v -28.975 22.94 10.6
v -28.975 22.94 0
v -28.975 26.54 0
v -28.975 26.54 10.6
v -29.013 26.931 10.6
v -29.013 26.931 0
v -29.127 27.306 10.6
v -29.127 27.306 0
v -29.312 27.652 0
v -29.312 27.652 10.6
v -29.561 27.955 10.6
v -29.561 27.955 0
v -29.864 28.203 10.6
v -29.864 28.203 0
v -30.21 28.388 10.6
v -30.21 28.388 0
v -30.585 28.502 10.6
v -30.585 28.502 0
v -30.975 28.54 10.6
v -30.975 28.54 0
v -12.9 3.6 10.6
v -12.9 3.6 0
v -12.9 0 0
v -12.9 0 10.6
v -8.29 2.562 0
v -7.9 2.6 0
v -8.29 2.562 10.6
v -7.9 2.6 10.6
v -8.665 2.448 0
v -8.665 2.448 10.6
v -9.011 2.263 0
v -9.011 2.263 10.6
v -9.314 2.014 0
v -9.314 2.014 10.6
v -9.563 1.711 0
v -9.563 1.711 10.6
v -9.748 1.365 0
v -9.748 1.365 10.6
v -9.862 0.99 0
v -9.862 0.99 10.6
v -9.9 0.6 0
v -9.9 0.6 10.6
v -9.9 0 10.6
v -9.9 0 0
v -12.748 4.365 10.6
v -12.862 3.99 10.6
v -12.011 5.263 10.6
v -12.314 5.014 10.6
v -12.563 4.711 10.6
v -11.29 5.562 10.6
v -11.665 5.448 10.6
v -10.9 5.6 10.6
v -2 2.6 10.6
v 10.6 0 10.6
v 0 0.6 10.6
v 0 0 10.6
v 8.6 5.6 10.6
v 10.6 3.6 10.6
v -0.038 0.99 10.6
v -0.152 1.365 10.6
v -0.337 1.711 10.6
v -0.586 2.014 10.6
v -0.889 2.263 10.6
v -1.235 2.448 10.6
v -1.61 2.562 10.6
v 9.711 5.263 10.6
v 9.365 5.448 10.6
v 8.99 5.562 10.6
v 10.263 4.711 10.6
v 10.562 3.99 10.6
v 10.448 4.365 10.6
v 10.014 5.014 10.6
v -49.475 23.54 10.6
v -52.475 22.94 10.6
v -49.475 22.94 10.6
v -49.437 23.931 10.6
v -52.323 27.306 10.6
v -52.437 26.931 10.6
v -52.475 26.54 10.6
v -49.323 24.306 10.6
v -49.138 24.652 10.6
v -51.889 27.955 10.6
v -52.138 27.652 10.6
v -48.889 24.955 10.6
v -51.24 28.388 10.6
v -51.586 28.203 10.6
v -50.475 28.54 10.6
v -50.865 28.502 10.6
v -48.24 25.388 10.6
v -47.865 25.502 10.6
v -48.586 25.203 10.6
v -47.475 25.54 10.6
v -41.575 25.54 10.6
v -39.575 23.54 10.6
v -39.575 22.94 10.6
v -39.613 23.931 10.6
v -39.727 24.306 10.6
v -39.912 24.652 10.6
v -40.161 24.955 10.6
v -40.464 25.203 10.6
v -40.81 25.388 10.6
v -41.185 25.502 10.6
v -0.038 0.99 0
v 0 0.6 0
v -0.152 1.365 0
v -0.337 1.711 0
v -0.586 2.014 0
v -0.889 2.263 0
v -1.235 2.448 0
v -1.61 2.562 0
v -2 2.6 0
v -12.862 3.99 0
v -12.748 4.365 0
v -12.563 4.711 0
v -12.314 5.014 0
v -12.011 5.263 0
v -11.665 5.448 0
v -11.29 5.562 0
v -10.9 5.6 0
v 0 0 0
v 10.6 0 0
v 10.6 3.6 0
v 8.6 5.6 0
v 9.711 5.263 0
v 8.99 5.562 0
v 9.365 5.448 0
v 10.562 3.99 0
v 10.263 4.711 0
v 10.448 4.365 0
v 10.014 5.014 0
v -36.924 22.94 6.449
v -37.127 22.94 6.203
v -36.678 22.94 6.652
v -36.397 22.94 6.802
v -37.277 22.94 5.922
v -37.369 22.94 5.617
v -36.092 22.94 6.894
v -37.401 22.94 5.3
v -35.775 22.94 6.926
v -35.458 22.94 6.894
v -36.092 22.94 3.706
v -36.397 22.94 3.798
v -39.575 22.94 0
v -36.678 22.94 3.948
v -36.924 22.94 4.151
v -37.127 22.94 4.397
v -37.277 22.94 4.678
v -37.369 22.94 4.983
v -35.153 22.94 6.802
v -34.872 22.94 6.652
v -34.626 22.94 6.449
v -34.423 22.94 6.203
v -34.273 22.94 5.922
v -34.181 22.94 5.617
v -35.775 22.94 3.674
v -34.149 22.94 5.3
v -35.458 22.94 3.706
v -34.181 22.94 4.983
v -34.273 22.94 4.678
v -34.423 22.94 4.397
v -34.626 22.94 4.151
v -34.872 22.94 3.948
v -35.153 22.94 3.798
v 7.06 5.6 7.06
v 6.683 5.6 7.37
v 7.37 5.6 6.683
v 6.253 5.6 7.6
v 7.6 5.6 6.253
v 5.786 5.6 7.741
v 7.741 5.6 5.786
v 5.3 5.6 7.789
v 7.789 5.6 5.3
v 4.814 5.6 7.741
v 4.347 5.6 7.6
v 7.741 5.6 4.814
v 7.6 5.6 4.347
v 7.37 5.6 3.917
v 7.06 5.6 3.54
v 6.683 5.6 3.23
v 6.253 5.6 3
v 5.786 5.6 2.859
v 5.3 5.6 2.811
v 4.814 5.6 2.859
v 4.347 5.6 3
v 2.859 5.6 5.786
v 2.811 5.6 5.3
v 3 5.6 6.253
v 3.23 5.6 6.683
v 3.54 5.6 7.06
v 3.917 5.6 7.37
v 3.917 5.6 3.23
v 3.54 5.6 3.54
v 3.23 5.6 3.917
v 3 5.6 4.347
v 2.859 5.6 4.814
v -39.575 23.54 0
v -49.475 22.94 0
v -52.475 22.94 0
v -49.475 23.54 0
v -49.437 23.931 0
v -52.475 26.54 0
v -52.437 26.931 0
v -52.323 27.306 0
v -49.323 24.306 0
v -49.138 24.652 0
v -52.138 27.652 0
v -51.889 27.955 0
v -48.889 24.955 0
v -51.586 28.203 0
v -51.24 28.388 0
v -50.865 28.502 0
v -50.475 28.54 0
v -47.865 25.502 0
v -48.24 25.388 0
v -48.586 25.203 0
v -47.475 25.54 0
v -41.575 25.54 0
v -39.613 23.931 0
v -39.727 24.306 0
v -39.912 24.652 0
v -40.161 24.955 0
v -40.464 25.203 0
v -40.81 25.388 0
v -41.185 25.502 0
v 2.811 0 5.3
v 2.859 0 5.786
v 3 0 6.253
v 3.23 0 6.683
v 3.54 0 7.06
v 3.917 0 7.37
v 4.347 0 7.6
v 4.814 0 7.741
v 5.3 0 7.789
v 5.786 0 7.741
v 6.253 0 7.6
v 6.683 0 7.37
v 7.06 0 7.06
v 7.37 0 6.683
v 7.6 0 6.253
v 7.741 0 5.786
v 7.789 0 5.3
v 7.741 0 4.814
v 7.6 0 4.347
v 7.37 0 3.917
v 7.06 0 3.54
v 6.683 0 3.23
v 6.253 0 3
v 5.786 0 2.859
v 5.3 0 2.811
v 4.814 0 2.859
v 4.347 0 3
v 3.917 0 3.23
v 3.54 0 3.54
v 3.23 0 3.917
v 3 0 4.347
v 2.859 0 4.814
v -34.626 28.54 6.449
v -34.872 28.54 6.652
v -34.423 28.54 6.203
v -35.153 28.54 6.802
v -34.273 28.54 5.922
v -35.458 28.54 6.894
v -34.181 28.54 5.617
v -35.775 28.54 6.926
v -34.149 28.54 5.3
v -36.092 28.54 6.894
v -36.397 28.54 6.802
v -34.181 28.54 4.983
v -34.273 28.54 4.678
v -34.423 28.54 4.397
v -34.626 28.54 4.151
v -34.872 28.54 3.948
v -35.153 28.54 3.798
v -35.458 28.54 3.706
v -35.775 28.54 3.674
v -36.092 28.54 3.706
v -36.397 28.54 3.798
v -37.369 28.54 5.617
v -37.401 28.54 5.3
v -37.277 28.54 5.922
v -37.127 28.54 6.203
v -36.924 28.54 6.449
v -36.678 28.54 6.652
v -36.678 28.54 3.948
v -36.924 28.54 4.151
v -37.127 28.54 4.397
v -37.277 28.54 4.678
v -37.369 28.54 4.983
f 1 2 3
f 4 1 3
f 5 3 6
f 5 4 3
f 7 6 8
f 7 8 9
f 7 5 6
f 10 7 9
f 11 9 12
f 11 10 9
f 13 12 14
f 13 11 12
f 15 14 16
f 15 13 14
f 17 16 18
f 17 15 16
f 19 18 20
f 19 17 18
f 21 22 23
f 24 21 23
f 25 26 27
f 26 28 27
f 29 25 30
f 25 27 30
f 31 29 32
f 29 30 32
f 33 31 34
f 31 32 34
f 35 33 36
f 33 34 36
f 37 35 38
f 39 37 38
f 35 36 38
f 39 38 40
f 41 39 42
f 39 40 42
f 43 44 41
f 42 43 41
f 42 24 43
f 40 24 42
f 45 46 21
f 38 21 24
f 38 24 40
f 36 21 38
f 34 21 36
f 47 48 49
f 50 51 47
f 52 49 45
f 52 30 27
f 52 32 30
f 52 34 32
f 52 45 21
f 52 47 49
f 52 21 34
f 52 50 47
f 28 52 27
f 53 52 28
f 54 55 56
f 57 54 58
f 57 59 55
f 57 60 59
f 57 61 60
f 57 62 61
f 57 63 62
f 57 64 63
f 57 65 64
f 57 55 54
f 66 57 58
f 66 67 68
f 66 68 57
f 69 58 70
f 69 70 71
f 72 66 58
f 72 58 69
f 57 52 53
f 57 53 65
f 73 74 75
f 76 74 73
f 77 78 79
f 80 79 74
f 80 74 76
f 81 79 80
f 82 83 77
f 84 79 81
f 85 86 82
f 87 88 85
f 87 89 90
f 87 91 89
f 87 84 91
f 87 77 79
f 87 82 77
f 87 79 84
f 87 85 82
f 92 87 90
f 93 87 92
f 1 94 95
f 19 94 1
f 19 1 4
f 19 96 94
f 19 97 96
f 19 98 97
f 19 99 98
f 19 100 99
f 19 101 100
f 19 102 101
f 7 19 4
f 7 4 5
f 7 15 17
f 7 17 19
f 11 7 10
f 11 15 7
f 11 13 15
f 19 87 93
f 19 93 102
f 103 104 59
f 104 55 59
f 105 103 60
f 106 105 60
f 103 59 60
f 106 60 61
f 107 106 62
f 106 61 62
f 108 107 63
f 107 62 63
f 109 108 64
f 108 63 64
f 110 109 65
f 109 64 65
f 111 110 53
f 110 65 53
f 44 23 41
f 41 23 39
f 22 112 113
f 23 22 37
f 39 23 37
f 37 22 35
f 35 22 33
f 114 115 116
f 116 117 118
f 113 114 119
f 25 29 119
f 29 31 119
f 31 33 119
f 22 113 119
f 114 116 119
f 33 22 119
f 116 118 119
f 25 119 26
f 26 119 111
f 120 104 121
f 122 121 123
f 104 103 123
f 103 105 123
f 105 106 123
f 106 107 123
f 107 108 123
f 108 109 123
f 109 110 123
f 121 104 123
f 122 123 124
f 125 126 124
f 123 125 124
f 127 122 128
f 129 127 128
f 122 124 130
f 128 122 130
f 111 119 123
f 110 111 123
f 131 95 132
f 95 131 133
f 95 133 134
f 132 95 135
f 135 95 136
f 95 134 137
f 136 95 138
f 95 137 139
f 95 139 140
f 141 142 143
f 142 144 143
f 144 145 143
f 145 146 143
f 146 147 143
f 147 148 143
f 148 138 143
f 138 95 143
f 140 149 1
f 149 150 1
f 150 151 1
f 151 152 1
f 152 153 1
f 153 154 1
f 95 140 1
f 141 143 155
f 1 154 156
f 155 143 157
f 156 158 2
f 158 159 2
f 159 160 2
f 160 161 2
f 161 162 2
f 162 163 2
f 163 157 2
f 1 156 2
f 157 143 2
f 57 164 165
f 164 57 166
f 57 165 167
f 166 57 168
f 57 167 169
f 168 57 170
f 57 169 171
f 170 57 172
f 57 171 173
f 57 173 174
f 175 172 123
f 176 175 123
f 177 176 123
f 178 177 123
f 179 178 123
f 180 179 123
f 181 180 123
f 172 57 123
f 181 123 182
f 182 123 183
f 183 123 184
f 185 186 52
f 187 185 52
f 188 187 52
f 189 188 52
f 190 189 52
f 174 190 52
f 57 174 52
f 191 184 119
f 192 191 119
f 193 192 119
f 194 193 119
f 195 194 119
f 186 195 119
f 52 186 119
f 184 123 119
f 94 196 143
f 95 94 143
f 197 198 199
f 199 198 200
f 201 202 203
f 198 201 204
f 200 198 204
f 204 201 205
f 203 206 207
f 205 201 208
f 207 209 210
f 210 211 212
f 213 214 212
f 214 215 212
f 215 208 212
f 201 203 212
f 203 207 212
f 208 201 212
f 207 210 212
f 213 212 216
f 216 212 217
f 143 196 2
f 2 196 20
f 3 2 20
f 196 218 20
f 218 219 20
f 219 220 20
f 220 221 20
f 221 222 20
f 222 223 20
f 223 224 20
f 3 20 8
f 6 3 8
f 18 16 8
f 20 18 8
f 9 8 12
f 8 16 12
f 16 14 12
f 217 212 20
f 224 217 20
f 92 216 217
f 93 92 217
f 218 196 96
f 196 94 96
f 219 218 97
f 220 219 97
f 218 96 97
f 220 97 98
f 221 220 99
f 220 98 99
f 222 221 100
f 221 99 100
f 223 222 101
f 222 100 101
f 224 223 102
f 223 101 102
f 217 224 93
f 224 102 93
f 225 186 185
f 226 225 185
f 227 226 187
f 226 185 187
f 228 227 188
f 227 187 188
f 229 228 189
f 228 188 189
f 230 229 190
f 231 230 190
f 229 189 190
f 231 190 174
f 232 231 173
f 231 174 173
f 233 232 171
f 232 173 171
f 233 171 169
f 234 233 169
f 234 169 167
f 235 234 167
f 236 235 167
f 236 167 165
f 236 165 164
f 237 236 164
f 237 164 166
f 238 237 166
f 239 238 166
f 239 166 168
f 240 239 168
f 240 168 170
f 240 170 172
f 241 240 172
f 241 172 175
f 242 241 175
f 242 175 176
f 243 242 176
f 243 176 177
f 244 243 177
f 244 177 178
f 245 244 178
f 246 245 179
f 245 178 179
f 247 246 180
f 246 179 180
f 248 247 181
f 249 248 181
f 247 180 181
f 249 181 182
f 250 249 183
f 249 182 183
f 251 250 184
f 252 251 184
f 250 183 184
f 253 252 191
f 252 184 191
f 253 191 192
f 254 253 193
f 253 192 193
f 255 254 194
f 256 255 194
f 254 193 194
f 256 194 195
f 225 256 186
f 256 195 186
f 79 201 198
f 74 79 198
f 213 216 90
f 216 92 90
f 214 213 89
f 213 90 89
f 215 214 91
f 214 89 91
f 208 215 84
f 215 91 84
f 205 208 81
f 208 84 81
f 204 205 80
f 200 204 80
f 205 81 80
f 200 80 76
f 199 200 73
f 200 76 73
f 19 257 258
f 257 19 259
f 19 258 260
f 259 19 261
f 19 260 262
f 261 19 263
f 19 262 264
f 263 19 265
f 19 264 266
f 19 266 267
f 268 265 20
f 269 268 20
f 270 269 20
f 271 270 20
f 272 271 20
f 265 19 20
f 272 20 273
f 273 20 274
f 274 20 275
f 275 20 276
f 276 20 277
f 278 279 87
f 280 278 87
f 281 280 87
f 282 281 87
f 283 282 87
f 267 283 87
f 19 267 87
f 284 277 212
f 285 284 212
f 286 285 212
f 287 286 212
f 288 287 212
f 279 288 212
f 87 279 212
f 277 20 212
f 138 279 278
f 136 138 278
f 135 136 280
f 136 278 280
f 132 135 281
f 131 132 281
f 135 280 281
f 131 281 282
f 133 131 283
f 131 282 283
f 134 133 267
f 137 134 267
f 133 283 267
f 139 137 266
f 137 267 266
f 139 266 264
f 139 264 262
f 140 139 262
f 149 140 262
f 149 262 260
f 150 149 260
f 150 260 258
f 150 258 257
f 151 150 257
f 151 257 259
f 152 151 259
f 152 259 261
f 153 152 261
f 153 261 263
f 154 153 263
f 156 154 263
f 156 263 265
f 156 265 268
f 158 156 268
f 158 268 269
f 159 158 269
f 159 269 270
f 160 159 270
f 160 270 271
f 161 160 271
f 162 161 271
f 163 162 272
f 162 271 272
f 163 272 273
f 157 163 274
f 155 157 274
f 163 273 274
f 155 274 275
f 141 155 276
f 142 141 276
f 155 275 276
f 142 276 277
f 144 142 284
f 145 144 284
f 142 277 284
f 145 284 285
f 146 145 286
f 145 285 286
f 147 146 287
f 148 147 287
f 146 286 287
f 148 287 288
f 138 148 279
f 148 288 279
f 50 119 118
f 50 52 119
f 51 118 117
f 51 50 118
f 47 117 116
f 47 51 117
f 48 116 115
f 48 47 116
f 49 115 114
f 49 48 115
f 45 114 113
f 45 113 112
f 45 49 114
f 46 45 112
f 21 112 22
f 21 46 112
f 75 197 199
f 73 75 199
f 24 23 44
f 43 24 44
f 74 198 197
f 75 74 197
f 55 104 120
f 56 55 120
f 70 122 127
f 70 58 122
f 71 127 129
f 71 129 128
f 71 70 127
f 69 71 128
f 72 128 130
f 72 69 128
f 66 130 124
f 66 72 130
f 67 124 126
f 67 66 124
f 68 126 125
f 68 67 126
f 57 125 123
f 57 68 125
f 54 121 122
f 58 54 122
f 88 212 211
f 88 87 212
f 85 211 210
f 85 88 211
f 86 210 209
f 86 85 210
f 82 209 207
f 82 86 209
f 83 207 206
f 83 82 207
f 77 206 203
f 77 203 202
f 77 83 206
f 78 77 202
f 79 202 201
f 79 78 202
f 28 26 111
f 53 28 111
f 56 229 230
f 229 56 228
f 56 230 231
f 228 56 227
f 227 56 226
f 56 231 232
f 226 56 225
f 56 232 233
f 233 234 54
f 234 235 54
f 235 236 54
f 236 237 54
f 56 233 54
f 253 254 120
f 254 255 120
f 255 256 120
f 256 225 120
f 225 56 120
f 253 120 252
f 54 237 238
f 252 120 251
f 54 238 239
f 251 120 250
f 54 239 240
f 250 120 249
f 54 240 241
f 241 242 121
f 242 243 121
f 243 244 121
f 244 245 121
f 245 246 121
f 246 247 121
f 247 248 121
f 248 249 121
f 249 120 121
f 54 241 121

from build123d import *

# Parameters (mm, degrees)
F1_DEPTH = 10.6
F3_D     = 4.9784
F4_R     = 2
F6_DEPTH = 10.6
F8_D     = 3.2512
F9_R     = 2


with BuildPart() as f1:
    # F0 (on Top) → F1 (new body)
    with BuildSketch(Plane.XY):
        Polygon((0, 2.6), (0, 0), (10.6, 0), (10.6, 5.6), (-12.9, 5.6), (-12.9, 0), (-9.9, 0), (-9.9, 2.6), align=None)
    extrude(amount=F1_DEPTH)

    # F3 (through all)
    with Locations(Plane.XZ):
        with Locations((5.3, 5.3)):
            Hole(F3_D / 2)

    # F4
    f4_edges = [f1.edges().sort_by_distance(p)[0] for p in [
        (-9.9, 2.6, 5.3),
        (0, 2.6, 5.3),
        (-12.9, 5.6, 5.3),
        (10.6, 5.6, 5.3),
    ]]
    fillet(f4_edges, radius=F4_R)


with BuildPart() as f6:
    # F5 (on Top) → F6 (new body)
    with BuildSketch(Plane.XY):
        Polygon((-39.5750029802, 25.540386501), (-39.5750029802, 22.940386501), (-28.9750029802, 22.940386501), (-28.9750029802, 28.540386501), (-52.4750029802, 28.540386501), (-52.4750029802, 22.940386501), (-49.4750029802, 22.940386501), (-49.4750029802, 25.540386501), align=None)
    extrude(amount=F6_DEPTH)

    # F8 (through all)
    with Locations(Plane.XZ.offset(-22.940386501)):
        with Locations((-35.7750024021, 5.3)):
            Hole(F8_D / 2)

    # F9
    f9_edges = [f6.edges().sort_by_distance(p)[0] for p in [
        (-49.475003, 25.540387, 5.3),
        (-39.575003, 25.540387, 5.3),
        (-52.475003, 28.540387, 5.3),
        (-28.975003, 28.540387, 5.3),
    ]]
    fillet(f9_edges, radius=F9_R)


solid = Compound([f1.part, f6.part])
